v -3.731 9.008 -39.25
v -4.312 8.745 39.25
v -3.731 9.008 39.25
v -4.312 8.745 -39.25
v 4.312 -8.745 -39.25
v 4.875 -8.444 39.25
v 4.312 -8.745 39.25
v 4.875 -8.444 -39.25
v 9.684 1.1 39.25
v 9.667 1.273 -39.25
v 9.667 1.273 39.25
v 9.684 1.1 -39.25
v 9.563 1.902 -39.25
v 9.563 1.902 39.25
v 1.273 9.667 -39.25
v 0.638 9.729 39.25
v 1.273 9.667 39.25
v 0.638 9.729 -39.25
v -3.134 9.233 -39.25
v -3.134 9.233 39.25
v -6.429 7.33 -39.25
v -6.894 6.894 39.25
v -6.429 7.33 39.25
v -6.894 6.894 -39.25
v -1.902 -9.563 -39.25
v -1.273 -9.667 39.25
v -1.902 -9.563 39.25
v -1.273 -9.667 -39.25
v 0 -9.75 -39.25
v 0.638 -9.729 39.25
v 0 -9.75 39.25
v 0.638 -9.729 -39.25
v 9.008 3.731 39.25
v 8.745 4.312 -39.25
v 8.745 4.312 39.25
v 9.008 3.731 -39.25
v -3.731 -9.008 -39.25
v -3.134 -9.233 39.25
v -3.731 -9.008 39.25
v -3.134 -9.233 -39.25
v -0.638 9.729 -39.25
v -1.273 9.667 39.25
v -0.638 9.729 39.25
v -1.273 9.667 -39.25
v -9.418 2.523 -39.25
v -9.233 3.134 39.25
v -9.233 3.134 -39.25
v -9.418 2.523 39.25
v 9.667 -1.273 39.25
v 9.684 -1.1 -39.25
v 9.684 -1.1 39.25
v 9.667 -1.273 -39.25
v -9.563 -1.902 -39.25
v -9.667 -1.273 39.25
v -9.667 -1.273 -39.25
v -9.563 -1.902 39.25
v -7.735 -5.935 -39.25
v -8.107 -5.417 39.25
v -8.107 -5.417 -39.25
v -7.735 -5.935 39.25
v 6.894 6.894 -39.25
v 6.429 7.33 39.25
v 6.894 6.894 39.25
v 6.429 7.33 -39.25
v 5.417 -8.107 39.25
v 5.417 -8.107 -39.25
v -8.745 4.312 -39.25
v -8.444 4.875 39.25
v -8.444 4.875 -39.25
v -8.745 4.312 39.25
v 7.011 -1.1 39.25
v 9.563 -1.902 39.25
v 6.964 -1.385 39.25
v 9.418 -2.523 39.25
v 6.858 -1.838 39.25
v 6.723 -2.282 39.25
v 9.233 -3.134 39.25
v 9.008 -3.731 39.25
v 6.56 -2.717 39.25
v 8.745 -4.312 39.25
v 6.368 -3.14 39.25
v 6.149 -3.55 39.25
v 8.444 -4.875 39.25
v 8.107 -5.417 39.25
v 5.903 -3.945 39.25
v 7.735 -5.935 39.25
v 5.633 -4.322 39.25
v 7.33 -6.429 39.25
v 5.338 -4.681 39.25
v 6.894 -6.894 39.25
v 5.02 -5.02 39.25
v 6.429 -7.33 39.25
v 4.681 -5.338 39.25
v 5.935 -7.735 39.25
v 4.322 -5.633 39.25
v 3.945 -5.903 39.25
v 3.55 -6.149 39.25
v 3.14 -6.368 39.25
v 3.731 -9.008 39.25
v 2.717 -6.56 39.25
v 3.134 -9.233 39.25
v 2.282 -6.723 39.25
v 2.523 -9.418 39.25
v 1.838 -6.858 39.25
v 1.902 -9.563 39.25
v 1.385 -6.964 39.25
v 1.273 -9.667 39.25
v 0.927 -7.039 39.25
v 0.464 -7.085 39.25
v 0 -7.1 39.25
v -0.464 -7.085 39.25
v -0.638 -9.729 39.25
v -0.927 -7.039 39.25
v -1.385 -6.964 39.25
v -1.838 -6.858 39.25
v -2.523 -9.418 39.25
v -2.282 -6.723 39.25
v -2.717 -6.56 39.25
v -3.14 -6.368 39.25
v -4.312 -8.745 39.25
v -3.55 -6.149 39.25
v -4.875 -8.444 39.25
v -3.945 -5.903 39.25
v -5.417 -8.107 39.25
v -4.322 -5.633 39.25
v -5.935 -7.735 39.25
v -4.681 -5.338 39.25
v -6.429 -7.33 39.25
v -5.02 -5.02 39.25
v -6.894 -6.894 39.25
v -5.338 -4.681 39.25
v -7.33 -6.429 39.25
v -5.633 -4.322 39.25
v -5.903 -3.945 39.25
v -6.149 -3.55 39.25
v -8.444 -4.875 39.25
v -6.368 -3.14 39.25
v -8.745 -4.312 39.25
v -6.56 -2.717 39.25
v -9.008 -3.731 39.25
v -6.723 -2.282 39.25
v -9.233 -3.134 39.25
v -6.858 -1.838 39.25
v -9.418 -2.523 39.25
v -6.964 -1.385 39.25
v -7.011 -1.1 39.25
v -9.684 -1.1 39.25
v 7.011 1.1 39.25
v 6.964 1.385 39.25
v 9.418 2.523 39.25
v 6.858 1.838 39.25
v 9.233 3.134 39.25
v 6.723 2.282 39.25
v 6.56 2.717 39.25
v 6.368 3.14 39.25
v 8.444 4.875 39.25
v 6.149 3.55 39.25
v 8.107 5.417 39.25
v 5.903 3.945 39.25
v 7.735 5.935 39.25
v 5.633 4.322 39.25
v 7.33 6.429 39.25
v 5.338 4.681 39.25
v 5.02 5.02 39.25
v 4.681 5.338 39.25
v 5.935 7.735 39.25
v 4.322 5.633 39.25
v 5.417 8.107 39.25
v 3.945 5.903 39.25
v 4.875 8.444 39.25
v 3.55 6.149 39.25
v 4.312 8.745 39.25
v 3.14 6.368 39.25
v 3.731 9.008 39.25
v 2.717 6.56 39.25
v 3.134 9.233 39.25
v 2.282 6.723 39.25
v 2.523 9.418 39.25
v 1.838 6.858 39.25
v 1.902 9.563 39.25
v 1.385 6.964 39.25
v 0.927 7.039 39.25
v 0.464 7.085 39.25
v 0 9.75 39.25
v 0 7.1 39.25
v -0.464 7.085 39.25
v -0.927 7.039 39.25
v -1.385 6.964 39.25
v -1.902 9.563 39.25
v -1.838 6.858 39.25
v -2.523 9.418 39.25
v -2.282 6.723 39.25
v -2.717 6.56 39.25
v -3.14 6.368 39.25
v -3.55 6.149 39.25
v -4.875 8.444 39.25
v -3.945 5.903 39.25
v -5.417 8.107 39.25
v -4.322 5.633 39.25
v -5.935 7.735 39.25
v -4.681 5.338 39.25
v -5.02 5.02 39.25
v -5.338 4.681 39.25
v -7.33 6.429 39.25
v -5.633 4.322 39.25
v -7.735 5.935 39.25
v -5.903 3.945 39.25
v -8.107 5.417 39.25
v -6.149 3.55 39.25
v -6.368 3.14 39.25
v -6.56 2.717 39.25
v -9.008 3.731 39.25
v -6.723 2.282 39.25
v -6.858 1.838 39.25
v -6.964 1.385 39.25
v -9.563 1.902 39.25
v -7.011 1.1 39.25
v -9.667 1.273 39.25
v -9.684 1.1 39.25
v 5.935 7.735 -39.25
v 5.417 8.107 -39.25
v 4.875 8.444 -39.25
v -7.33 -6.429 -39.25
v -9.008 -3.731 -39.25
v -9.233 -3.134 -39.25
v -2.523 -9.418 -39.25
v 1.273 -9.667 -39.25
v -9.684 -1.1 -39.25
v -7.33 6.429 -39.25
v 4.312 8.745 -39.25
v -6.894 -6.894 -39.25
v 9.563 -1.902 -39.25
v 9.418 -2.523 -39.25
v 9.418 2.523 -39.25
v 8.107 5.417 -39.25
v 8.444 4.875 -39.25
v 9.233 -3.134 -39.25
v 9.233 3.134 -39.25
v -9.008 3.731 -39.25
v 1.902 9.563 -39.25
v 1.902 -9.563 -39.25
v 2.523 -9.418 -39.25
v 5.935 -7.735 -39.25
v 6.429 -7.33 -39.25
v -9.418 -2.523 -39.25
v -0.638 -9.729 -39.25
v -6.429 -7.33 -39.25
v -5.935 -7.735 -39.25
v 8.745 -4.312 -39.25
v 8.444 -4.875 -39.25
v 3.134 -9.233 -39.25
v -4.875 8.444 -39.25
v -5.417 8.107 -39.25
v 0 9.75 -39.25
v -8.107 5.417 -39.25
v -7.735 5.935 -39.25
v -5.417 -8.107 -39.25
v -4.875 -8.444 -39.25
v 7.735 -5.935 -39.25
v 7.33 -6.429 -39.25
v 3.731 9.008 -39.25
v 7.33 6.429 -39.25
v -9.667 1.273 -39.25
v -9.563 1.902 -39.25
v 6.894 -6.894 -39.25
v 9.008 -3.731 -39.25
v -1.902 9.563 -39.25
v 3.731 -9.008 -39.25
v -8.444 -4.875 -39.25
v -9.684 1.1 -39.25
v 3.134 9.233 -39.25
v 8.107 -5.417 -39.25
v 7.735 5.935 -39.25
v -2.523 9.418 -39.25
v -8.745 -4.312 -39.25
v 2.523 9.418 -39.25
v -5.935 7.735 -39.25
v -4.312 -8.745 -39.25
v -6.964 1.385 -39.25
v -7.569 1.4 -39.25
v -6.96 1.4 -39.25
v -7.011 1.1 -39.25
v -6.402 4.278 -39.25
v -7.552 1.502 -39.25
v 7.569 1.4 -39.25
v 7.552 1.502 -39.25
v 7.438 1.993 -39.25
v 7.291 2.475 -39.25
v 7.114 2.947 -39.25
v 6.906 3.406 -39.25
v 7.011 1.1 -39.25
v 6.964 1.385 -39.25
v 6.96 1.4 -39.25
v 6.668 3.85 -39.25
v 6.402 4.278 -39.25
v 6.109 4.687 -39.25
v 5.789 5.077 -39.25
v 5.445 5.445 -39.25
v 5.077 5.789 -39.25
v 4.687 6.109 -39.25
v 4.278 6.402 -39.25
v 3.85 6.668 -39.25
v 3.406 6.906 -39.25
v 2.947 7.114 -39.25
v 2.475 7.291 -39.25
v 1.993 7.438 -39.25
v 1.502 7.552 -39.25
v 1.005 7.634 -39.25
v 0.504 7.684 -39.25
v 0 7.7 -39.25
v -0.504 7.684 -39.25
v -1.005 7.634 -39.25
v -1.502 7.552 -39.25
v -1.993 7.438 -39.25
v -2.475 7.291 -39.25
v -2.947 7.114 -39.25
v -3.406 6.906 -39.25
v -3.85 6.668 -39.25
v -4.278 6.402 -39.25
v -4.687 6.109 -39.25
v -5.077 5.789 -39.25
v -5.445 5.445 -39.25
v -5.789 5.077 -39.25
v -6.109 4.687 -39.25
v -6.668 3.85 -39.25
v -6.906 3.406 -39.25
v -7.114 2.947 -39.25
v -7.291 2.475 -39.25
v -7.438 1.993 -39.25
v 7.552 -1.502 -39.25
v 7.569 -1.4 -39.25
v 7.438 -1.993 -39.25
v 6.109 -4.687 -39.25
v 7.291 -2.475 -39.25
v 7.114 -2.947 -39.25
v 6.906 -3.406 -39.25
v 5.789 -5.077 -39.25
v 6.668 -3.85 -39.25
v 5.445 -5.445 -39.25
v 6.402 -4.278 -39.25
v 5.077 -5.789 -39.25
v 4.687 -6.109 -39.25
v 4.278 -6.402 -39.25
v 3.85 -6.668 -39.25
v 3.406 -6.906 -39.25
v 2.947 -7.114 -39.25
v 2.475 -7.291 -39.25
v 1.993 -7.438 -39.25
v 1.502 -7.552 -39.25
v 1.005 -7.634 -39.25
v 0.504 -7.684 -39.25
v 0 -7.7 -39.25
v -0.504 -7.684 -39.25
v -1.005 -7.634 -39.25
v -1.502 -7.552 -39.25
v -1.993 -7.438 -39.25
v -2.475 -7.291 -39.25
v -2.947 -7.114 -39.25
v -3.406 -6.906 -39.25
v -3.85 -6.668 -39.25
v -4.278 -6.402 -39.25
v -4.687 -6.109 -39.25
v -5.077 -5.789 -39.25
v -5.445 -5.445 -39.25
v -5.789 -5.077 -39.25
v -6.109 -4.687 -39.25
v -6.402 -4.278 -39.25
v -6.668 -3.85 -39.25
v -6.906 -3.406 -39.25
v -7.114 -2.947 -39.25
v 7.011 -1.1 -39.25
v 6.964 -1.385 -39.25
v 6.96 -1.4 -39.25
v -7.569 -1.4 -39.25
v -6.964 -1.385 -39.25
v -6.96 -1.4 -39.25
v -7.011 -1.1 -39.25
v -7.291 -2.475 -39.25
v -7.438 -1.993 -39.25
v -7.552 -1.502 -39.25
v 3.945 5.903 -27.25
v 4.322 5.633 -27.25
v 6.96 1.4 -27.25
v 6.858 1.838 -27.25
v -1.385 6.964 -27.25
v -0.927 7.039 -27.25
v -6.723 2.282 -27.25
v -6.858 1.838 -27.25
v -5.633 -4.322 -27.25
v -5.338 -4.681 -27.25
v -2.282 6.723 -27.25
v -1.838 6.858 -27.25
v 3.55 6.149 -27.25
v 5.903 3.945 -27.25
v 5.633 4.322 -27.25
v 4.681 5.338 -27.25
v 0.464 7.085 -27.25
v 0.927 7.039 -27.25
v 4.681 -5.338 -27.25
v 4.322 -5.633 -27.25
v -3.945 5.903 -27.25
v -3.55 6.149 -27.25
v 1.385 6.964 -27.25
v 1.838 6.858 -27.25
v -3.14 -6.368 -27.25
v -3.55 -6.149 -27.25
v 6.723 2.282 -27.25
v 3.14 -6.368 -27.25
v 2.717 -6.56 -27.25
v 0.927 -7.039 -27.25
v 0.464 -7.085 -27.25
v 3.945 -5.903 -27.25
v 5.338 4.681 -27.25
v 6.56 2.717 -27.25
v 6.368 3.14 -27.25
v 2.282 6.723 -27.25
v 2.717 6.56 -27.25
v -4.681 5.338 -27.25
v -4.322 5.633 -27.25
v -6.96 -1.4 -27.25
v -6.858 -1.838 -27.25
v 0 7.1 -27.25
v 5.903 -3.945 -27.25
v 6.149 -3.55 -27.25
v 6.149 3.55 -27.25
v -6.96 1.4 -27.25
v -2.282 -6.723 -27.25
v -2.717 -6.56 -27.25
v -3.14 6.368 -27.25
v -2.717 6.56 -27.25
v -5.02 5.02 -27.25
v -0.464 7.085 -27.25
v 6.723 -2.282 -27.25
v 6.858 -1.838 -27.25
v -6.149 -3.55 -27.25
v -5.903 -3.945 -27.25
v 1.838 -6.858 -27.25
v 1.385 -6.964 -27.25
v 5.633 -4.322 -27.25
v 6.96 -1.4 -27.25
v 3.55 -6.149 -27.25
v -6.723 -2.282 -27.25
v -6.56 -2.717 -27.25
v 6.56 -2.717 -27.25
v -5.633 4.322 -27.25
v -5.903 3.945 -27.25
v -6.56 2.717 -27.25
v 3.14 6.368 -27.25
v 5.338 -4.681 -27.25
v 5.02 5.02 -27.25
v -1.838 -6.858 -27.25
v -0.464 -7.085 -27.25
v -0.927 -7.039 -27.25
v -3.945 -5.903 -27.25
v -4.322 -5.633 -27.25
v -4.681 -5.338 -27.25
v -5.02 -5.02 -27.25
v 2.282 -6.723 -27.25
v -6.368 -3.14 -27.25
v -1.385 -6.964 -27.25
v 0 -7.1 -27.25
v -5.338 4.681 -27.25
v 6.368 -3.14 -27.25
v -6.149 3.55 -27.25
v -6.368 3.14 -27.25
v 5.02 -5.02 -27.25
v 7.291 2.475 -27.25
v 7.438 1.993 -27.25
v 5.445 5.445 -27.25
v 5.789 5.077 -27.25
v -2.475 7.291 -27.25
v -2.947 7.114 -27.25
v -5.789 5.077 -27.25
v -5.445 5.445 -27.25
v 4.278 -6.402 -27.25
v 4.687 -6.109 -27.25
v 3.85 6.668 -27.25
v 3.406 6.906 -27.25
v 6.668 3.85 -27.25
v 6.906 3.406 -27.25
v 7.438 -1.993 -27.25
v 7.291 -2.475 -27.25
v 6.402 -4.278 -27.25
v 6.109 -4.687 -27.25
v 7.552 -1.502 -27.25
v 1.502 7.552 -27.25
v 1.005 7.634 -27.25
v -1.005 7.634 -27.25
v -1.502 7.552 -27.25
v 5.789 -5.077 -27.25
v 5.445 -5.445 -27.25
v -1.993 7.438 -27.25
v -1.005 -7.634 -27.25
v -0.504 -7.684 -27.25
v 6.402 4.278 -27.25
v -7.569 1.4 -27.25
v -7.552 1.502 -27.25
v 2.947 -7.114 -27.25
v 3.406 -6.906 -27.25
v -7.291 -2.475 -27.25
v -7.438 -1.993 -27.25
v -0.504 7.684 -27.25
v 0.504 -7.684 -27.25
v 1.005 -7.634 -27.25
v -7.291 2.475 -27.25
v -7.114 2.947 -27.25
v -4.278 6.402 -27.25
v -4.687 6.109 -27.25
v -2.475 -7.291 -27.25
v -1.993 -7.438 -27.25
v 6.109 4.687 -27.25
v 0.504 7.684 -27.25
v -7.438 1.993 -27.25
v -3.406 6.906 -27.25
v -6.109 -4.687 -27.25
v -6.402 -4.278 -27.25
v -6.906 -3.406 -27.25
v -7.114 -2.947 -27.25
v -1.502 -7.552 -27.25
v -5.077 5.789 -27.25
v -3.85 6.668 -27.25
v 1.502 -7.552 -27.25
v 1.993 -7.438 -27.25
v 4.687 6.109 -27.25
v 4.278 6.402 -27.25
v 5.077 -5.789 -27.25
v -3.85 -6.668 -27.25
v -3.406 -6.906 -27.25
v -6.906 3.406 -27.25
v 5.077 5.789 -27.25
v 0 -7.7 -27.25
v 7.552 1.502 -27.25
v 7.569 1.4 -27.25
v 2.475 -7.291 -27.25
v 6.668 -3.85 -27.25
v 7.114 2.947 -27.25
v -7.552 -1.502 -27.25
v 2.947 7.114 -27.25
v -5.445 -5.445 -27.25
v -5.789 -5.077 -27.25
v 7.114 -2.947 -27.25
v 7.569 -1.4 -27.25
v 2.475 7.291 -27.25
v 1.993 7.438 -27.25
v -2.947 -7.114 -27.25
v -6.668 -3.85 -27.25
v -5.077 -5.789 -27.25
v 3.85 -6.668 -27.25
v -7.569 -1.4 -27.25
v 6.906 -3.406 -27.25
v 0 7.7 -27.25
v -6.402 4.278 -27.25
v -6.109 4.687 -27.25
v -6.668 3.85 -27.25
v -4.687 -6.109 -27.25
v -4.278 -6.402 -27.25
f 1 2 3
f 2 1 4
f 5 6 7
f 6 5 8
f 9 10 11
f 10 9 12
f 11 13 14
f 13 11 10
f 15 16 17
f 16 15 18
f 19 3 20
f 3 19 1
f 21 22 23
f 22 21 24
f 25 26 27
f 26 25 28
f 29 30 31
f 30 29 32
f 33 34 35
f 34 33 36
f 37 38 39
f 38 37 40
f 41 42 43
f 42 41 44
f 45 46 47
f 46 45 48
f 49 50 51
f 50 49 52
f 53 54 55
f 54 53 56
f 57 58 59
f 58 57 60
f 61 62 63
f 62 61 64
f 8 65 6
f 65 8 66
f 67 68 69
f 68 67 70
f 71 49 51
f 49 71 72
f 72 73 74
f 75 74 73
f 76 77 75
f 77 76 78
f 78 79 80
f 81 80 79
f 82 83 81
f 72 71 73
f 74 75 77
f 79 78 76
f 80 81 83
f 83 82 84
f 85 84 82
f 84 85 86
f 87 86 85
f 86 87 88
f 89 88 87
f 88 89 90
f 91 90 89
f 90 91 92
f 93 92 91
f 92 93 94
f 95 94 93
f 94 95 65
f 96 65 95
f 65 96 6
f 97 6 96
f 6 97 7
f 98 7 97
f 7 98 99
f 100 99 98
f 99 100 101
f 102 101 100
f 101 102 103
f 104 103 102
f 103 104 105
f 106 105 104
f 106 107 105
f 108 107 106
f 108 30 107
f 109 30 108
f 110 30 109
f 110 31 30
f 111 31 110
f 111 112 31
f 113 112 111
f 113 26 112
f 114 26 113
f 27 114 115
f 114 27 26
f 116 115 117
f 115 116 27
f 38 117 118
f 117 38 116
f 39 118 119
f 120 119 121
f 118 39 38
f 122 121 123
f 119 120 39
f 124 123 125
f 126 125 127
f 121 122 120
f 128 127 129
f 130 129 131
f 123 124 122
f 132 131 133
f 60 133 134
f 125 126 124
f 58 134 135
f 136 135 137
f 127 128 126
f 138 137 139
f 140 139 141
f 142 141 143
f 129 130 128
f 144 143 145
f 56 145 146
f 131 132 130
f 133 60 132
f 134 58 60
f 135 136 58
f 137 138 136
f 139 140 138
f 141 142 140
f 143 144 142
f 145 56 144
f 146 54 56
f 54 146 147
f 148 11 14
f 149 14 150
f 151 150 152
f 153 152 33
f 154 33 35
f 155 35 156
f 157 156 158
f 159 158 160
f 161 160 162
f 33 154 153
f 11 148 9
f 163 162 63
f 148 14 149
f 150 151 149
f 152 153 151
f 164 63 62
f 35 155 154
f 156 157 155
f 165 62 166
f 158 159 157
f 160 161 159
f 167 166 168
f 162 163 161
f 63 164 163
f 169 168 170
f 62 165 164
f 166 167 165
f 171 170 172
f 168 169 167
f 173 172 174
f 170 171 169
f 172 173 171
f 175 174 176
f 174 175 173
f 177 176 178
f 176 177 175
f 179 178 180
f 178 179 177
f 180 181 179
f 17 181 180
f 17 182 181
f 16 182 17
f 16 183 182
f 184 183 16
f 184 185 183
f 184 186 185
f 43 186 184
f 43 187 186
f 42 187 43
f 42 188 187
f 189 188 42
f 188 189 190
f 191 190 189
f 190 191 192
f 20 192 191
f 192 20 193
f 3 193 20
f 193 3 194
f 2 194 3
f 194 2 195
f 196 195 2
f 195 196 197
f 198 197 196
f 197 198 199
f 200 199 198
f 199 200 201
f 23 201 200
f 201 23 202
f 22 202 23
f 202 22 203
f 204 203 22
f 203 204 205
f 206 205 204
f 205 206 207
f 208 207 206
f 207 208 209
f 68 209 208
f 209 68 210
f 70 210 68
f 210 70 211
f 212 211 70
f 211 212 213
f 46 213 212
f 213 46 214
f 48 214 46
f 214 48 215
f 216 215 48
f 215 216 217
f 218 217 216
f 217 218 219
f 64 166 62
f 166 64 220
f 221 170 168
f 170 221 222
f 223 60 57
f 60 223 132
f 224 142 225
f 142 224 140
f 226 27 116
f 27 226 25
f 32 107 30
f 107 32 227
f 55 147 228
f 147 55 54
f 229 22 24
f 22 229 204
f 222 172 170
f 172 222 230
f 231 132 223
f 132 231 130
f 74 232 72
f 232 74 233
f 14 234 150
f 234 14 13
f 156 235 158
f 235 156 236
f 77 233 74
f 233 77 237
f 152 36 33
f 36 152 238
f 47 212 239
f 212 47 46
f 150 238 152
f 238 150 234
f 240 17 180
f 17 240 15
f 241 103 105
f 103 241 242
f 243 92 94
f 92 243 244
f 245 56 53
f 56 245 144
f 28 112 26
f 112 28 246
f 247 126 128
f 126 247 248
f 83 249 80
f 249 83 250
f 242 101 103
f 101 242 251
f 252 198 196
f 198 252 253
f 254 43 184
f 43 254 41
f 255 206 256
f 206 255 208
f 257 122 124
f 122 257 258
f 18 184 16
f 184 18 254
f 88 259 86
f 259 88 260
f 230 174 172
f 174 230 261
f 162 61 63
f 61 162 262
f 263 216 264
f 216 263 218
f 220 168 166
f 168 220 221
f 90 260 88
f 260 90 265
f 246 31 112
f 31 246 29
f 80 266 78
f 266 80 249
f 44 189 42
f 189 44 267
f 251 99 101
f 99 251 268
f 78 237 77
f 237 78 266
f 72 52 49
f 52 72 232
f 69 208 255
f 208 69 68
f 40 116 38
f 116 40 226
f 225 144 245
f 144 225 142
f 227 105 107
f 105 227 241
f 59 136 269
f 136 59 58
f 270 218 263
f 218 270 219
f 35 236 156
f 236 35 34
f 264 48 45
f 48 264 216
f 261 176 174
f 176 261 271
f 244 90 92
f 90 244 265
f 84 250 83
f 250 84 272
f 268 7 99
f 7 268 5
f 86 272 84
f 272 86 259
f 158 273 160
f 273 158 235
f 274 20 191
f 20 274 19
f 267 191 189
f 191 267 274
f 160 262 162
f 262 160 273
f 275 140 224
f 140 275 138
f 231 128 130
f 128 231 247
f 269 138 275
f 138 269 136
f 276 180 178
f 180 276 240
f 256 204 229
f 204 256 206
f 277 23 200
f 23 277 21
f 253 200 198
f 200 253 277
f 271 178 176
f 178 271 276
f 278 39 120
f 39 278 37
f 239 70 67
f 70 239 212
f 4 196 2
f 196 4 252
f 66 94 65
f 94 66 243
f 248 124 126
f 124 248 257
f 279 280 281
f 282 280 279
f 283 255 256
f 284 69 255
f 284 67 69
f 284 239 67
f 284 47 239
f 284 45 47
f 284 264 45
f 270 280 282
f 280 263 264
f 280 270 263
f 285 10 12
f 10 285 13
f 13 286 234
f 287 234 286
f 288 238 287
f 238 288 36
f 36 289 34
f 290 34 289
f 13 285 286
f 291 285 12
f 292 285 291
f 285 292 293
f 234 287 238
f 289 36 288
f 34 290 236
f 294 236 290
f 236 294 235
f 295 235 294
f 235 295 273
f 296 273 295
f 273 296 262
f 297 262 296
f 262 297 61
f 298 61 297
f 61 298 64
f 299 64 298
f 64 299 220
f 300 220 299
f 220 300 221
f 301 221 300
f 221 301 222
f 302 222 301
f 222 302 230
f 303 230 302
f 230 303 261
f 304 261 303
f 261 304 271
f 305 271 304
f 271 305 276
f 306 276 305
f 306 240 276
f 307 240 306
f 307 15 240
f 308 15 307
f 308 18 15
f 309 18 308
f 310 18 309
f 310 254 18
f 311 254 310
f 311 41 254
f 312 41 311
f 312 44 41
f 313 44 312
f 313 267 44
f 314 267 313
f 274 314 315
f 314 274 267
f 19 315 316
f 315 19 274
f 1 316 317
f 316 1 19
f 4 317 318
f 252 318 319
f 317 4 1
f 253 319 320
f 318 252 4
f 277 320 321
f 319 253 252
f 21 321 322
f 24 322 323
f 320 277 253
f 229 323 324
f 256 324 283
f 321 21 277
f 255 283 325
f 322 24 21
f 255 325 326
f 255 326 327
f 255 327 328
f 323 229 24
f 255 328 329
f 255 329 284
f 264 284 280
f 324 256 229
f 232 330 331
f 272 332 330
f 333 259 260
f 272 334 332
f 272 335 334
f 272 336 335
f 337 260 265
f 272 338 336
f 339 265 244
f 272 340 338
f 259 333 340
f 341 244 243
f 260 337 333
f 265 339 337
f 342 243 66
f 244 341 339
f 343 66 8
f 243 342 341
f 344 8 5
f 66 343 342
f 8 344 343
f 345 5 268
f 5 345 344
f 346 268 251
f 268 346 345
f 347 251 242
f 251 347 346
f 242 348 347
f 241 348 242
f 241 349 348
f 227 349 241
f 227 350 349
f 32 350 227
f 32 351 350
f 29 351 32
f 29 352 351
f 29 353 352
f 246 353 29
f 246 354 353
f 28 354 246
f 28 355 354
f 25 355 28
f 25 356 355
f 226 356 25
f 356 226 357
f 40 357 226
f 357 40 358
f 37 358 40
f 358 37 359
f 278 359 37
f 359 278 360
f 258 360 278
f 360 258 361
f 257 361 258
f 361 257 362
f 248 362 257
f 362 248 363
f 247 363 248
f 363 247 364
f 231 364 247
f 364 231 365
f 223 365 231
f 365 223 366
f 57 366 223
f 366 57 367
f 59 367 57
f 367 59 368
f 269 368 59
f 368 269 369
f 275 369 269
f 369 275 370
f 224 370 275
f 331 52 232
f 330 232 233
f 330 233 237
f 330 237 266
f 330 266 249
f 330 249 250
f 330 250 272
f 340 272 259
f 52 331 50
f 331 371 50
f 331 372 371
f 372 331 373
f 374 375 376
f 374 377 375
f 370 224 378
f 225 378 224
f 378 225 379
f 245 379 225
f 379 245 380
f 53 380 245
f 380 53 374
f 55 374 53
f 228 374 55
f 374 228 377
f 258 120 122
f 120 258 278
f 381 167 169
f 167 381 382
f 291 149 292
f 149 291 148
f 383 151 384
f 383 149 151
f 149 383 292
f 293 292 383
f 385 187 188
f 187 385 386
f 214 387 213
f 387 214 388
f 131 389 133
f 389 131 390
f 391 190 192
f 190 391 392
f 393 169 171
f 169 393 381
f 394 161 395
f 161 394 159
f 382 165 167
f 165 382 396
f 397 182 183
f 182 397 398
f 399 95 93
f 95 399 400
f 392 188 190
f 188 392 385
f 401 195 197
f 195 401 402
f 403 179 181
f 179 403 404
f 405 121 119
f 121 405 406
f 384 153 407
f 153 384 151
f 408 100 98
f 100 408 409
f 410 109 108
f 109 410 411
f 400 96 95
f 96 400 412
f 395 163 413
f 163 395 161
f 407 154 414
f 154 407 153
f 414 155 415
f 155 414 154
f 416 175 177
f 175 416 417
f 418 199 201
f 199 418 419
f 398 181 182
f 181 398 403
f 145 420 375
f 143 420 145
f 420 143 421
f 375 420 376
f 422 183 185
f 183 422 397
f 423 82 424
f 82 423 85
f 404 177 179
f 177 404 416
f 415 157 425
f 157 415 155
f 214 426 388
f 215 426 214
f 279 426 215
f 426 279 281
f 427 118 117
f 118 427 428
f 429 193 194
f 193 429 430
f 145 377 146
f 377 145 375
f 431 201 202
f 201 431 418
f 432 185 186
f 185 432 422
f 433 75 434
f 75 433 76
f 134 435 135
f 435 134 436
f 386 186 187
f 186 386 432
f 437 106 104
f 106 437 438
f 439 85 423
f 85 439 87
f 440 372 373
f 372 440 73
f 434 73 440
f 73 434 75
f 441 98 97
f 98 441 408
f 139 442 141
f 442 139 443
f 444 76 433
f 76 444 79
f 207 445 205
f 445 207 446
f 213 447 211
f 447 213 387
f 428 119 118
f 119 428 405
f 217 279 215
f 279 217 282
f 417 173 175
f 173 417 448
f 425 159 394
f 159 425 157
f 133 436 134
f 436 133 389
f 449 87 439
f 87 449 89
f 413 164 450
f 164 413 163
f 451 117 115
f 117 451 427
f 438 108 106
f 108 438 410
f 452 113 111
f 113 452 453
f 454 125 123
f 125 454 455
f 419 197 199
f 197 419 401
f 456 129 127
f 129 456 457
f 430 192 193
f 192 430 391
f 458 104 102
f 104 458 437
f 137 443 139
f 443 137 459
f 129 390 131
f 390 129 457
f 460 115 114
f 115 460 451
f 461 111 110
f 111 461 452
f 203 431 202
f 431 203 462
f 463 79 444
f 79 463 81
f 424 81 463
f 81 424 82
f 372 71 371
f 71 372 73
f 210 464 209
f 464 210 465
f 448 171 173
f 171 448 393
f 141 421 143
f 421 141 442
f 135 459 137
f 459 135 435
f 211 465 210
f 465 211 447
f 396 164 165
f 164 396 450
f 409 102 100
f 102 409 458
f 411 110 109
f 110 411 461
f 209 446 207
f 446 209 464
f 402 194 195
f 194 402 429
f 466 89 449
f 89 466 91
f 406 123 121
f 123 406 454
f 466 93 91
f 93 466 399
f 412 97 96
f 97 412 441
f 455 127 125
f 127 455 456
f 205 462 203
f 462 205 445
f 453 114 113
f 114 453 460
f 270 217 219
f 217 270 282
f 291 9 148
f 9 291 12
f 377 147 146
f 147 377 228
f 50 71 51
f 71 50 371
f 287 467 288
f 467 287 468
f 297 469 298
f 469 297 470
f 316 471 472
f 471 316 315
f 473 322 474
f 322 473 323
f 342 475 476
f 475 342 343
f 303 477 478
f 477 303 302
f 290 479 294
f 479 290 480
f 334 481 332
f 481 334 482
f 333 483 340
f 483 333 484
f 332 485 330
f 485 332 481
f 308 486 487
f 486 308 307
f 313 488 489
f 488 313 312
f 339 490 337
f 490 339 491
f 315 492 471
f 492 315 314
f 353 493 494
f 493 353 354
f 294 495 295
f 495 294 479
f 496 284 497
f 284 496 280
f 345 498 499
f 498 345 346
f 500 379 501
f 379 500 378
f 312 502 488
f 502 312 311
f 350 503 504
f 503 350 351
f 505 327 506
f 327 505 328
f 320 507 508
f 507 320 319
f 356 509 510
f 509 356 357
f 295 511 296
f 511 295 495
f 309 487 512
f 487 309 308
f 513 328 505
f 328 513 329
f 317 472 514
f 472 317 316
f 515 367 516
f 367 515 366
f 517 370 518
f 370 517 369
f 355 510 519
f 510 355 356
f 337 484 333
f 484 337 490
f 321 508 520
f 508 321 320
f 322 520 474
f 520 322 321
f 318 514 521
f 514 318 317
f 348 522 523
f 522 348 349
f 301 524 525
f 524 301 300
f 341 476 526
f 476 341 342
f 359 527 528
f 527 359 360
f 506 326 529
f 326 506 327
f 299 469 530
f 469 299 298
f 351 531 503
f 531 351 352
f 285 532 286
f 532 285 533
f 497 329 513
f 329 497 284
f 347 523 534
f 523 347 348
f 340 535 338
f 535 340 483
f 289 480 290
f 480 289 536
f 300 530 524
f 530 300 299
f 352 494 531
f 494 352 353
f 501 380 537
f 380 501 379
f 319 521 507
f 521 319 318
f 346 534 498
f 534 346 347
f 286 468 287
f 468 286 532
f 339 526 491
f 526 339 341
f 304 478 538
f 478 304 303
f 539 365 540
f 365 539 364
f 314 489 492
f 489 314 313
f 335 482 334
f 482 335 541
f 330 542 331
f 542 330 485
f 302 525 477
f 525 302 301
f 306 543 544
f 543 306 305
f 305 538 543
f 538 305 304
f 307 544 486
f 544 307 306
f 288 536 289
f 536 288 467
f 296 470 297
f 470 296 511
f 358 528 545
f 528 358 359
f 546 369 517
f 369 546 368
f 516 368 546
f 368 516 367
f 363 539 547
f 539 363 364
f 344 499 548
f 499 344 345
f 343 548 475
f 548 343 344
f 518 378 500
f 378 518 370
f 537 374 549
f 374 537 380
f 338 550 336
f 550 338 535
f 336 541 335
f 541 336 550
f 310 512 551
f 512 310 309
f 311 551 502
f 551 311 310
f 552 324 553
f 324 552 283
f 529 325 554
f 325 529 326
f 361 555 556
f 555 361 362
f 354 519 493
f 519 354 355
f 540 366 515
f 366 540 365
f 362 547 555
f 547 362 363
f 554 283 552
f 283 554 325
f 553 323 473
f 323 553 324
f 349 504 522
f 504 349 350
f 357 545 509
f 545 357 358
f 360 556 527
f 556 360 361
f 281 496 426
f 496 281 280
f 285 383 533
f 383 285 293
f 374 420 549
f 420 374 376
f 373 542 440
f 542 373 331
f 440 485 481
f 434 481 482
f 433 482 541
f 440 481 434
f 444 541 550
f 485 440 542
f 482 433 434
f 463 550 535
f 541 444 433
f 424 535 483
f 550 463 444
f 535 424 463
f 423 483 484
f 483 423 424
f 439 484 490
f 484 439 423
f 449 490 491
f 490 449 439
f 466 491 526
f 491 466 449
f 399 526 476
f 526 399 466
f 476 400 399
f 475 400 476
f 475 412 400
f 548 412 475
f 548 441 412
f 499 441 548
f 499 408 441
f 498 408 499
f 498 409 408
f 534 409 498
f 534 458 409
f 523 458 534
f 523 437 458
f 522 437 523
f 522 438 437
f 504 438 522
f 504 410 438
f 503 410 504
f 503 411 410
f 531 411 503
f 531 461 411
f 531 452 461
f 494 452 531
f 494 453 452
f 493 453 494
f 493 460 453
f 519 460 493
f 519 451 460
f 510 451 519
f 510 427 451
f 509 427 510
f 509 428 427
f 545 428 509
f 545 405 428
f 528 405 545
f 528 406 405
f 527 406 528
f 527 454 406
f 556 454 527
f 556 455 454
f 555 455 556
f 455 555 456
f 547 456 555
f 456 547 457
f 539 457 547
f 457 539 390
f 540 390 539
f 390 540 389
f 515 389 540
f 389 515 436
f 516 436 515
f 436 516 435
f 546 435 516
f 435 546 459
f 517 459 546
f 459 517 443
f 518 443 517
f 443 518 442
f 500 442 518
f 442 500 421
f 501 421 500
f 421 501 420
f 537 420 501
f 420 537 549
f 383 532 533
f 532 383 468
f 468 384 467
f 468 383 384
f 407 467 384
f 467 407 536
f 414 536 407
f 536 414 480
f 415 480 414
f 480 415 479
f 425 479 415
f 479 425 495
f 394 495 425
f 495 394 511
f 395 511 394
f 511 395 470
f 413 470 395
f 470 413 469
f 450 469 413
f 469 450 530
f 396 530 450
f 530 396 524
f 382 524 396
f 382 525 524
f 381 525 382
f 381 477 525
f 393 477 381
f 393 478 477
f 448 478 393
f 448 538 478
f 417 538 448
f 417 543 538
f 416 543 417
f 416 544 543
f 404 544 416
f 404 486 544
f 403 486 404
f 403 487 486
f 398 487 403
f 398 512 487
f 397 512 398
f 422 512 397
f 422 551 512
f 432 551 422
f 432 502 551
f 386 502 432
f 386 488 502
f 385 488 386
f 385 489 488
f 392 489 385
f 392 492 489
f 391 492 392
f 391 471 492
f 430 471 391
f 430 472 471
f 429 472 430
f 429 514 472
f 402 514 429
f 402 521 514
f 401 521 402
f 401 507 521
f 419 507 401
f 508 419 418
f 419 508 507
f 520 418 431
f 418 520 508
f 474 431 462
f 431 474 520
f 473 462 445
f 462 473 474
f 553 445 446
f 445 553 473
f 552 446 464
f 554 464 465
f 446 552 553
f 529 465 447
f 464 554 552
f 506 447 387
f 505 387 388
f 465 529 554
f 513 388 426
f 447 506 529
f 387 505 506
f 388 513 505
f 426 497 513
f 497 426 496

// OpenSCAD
$fn=96;

outer_d = 19.5;
height = 78.5;

inner_d_main = 14.2;

gap_w = 2.2;

notch_len = 12.0;
notch_depth = 0.6;
notch_count = 4;
notch_pitch = 2.0;
notch_width = 1.2;

module c_sleeve_body(od, id, h, gapw){
    difference(){
        cylinder(d=od, h=h, center=true);
        cylinder(d=id, h=h+0.4, center=true);
        translate([0,0,0])
            cube([od+2, gapw, h+0.6], center=true);
    }
}

module internal_notches(id, h, gapw, len, depth, count, pitch, w){
    for(i=[0:count-1]){
        zpos = -h/2 + (i+0.5)*pitch;
        translate([0,0,zpos])
            difference(){
                cylinder(d=id+2*depth, h=w, center=true);
                cylinder(d=id, h=w+0.2, center=true);
                cube([id+2*depth+4, gapw+0.6, w+0.4], center=true);
            }
    }
    translate([0,0,-h/2 + len/2])
        difference(){
            cylinder(d=id+2*depth, h=len, center=true);
            cylinder(d=id, h=len+0.2, center=true);
            cube([id+2*depth+4, gapw+0.6, len+0.4], center=true);
        }
}

difference(){
    c_sleeve_body(outer_d, inner_d_main, height, gap_w);
    internal_notches(inner_d_main, height, gap_w, notch_len, notch_depth, notch_count, notch_pitch, notch_width);
}
